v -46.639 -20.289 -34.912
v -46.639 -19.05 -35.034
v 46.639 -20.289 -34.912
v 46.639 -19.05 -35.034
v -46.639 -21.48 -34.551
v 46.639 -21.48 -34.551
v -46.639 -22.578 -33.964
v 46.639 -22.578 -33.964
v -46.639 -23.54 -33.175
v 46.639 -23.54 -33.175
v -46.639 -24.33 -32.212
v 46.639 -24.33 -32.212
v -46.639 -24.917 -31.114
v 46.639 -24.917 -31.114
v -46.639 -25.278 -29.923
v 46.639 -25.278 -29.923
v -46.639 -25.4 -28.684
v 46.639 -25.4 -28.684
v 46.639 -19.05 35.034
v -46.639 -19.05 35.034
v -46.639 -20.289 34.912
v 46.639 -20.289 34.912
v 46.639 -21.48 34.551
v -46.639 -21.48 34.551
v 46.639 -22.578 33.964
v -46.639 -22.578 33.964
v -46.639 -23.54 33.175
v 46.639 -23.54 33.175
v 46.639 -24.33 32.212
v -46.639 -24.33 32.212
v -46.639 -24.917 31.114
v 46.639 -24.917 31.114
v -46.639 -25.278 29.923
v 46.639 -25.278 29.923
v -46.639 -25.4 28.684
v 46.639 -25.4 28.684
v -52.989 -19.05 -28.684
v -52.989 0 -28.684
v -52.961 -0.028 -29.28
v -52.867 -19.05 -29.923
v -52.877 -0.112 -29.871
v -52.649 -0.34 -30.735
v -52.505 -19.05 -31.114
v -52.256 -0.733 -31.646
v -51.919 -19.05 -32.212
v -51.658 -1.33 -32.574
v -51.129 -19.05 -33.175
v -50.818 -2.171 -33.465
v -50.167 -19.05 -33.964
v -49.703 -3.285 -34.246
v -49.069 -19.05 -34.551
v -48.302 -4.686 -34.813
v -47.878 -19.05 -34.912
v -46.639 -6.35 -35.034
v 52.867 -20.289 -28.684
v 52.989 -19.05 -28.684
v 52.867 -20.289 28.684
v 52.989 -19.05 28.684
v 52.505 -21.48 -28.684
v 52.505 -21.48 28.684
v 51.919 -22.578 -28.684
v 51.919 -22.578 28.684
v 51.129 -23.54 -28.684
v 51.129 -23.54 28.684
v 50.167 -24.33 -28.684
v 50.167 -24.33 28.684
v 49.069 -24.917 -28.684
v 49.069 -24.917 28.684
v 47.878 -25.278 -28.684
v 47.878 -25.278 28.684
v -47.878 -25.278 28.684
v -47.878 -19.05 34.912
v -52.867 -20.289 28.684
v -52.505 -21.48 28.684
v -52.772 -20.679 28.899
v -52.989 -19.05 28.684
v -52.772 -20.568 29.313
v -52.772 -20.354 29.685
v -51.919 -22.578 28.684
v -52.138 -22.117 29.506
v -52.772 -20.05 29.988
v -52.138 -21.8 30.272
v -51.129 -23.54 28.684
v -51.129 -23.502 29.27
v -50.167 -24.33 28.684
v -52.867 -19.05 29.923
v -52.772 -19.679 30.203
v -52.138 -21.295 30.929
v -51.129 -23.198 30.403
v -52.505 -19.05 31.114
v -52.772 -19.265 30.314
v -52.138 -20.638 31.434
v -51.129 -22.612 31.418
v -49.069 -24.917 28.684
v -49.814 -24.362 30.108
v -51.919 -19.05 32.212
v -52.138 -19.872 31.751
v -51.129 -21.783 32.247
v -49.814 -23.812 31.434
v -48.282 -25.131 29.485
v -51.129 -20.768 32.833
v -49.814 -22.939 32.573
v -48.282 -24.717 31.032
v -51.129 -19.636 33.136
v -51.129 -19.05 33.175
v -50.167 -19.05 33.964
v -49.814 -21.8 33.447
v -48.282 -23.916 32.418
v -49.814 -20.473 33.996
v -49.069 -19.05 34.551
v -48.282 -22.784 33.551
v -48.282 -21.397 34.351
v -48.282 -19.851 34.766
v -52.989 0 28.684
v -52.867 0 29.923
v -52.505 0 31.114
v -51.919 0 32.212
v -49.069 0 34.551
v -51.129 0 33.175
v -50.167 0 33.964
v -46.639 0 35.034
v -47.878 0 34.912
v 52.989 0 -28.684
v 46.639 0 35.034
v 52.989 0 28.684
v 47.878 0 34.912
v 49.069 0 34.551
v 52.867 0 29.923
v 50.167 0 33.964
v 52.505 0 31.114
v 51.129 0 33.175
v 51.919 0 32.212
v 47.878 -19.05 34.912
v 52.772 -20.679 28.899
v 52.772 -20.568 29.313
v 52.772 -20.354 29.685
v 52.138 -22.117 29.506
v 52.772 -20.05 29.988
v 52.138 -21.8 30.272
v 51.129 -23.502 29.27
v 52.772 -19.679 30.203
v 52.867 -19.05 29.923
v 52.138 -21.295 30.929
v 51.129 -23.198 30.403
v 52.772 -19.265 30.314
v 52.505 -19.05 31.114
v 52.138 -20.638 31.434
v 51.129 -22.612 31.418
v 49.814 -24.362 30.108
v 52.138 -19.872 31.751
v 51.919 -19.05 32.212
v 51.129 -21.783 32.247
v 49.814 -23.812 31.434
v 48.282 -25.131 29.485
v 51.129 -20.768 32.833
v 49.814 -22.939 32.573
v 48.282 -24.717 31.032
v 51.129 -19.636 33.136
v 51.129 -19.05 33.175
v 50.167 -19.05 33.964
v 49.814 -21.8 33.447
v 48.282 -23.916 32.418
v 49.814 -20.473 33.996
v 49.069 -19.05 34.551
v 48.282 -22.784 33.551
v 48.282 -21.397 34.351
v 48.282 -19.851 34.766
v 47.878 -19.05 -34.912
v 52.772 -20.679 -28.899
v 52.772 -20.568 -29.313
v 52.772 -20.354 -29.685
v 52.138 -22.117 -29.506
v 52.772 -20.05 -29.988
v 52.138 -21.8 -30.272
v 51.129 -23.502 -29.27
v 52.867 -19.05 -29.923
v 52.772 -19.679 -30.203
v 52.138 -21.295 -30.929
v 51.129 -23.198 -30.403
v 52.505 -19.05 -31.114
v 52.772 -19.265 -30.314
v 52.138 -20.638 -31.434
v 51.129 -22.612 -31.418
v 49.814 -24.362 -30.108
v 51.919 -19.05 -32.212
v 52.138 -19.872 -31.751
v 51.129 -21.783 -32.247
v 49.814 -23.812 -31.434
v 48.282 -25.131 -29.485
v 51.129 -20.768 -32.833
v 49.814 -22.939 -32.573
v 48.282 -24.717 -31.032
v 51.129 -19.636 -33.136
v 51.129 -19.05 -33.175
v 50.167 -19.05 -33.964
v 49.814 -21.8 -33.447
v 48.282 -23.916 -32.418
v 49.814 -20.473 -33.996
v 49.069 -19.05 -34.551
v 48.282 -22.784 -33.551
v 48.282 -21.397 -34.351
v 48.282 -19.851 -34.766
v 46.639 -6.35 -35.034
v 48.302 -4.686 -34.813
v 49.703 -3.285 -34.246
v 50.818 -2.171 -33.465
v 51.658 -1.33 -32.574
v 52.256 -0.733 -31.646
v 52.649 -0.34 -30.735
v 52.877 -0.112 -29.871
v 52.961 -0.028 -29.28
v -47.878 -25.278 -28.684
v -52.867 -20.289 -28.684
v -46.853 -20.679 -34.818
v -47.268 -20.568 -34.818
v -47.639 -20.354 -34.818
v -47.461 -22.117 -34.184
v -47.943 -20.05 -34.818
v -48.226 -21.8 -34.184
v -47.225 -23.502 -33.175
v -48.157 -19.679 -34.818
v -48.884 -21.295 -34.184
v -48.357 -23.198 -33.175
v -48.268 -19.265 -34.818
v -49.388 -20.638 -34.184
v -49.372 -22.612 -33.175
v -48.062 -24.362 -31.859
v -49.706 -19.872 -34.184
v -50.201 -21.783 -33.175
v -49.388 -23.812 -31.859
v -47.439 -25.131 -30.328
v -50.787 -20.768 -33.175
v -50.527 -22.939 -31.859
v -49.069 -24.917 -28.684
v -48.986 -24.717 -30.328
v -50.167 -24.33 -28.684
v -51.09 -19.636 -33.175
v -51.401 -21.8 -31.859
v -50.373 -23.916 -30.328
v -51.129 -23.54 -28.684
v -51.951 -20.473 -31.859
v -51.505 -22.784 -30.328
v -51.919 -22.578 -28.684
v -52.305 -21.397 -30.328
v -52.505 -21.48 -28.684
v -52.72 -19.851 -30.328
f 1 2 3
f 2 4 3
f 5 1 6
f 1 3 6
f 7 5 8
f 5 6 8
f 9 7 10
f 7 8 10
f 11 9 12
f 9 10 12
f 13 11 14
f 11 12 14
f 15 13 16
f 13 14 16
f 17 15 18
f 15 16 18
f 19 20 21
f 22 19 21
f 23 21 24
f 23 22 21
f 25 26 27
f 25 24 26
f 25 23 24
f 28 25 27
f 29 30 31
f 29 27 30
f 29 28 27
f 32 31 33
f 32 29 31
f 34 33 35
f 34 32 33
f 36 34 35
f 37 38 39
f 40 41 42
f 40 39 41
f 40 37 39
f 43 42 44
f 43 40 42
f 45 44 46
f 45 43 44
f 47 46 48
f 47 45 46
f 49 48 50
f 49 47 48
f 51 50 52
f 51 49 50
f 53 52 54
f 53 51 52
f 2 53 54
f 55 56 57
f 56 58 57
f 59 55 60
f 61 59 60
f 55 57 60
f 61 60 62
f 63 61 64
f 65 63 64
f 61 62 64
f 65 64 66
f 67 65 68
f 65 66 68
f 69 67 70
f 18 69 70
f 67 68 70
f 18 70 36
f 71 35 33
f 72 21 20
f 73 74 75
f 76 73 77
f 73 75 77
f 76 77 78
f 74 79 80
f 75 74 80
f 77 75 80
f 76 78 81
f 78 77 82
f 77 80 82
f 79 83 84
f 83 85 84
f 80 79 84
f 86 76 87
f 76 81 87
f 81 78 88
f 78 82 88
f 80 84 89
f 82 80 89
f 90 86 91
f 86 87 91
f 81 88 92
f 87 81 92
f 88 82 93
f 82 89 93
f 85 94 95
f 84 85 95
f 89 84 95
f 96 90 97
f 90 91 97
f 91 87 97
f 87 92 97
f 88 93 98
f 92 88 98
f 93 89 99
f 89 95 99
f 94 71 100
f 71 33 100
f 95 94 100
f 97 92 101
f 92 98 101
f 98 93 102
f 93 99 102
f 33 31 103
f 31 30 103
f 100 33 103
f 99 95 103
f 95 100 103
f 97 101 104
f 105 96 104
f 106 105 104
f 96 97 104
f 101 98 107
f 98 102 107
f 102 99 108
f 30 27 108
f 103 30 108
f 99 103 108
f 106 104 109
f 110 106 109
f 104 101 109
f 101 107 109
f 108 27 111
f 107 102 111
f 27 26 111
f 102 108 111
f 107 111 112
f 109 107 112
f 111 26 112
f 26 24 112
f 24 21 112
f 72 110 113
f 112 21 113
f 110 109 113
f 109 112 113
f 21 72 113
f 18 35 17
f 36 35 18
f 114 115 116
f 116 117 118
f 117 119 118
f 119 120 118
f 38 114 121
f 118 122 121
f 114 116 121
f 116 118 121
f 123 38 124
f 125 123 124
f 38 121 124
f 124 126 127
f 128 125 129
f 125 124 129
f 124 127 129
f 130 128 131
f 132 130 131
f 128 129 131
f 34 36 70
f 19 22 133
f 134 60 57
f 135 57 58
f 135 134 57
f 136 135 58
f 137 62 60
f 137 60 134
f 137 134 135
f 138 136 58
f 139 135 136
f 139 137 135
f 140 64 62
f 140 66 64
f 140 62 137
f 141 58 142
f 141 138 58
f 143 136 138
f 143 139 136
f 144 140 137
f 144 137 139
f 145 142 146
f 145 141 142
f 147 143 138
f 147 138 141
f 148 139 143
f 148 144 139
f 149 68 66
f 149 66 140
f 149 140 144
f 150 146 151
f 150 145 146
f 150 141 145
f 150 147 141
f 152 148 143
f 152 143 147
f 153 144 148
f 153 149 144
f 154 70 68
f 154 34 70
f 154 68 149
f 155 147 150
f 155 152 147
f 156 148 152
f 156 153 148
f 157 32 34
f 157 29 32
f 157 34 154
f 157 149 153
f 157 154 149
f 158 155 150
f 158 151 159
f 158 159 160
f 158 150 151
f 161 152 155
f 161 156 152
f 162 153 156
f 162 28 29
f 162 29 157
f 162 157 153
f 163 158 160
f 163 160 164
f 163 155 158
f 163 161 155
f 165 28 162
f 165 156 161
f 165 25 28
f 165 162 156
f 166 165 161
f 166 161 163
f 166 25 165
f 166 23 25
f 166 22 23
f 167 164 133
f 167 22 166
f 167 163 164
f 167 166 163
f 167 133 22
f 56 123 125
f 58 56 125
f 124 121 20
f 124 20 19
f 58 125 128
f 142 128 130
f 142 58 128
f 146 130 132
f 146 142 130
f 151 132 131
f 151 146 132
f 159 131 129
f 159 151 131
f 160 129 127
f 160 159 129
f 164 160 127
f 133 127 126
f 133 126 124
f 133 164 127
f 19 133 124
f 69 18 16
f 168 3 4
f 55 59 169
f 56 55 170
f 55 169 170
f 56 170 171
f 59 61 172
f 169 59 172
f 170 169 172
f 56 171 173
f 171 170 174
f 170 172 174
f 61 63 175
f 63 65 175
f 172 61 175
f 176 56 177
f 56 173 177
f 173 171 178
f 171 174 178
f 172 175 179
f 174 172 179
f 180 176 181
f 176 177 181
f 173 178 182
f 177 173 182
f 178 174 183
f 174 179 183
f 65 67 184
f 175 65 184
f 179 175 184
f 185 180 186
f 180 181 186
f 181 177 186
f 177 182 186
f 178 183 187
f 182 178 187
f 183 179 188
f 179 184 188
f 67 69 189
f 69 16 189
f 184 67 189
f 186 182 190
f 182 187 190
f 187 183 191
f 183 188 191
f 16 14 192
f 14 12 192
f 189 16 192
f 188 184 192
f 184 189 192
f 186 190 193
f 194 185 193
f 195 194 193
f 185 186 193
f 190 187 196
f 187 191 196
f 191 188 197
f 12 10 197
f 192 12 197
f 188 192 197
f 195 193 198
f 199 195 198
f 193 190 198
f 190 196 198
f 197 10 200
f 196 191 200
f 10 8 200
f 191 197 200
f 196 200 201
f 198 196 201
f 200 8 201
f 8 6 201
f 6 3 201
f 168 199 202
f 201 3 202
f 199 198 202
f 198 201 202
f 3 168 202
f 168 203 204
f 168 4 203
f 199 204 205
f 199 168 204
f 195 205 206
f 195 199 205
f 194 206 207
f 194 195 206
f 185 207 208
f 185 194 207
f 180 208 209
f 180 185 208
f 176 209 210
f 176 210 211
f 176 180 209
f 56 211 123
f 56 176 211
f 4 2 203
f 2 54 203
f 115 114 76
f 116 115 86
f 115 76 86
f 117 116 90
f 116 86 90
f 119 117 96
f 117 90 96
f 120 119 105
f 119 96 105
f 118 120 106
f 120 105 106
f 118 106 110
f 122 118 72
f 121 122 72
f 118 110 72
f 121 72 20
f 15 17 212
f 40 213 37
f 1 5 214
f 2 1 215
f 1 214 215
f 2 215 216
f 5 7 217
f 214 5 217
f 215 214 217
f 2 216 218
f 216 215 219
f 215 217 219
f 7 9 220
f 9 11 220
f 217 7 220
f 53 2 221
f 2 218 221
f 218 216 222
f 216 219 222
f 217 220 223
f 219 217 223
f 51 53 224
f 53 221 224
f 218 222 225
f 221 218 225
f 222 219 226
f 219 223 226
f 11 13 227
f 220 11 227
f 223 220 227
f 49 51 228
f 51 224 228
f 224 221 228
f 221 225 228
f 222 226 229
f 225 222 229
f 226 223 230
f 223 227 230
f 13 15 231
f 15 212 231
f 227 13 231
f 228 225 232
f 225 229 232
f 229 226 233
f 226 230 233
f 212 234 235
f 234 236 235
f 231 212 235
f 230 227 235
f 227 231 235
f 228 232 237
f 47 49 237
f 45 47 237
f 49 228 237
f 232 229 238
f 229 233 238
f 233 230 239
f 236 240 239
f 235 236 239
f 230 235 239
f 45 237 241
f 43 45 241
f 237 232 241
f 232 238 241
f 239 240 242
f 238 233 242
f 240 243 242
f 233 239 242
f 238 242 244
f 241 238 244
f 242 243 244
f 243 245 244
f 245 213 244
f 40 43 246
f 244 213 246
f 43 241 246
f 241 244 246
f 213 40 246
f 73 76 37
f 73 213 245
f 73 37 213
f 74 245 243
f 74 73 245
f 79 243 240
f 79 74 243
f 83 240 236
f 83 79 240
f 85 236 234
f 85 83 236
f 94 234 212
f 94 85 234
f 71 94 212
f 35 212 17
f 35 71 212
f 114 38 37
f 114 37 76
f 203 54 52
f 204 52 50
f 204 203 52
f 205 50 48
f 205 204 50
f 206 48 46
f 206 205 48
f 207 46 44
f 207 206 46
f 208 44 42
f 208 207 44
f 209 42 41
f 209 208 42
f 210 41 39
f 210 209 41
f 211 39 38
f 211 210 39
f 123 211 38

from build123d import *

# Parameters (mm, degrees)
F0_W     = 105.97752
F0_H     = 70.068792
F1_DEPTH = 25.4
F2_R     = 6.35


with BuildPart() as f1:
    # F0 (on Front) → F1 (new body)
    with BuildSketch(Plane.XZ):
        Rectangle(F0_W, F0_H)
    extrude(amount=F1_DEPTH)

    # F2
    f2_edges = [f1.edges().sort_by_distance(p)[0] for p in [
        (0, -25.4, 35.034396),
        (-52.98876, -25.4, 0),
        (0, -25.4, -35.034396),
        (52.98876, -25.4, 0),
        (52.98876, -12.7, -35.034396),
        (52.98876, -12.7, 35.034396),
        (0, 0, -35.034396),
        (-52.98876, -12.7, -35.034396),
        (-52.98876, -12.7, 35.034396),
    ]]
    fillet(f2_edges, radius=F2_R)


solid = f1.part
